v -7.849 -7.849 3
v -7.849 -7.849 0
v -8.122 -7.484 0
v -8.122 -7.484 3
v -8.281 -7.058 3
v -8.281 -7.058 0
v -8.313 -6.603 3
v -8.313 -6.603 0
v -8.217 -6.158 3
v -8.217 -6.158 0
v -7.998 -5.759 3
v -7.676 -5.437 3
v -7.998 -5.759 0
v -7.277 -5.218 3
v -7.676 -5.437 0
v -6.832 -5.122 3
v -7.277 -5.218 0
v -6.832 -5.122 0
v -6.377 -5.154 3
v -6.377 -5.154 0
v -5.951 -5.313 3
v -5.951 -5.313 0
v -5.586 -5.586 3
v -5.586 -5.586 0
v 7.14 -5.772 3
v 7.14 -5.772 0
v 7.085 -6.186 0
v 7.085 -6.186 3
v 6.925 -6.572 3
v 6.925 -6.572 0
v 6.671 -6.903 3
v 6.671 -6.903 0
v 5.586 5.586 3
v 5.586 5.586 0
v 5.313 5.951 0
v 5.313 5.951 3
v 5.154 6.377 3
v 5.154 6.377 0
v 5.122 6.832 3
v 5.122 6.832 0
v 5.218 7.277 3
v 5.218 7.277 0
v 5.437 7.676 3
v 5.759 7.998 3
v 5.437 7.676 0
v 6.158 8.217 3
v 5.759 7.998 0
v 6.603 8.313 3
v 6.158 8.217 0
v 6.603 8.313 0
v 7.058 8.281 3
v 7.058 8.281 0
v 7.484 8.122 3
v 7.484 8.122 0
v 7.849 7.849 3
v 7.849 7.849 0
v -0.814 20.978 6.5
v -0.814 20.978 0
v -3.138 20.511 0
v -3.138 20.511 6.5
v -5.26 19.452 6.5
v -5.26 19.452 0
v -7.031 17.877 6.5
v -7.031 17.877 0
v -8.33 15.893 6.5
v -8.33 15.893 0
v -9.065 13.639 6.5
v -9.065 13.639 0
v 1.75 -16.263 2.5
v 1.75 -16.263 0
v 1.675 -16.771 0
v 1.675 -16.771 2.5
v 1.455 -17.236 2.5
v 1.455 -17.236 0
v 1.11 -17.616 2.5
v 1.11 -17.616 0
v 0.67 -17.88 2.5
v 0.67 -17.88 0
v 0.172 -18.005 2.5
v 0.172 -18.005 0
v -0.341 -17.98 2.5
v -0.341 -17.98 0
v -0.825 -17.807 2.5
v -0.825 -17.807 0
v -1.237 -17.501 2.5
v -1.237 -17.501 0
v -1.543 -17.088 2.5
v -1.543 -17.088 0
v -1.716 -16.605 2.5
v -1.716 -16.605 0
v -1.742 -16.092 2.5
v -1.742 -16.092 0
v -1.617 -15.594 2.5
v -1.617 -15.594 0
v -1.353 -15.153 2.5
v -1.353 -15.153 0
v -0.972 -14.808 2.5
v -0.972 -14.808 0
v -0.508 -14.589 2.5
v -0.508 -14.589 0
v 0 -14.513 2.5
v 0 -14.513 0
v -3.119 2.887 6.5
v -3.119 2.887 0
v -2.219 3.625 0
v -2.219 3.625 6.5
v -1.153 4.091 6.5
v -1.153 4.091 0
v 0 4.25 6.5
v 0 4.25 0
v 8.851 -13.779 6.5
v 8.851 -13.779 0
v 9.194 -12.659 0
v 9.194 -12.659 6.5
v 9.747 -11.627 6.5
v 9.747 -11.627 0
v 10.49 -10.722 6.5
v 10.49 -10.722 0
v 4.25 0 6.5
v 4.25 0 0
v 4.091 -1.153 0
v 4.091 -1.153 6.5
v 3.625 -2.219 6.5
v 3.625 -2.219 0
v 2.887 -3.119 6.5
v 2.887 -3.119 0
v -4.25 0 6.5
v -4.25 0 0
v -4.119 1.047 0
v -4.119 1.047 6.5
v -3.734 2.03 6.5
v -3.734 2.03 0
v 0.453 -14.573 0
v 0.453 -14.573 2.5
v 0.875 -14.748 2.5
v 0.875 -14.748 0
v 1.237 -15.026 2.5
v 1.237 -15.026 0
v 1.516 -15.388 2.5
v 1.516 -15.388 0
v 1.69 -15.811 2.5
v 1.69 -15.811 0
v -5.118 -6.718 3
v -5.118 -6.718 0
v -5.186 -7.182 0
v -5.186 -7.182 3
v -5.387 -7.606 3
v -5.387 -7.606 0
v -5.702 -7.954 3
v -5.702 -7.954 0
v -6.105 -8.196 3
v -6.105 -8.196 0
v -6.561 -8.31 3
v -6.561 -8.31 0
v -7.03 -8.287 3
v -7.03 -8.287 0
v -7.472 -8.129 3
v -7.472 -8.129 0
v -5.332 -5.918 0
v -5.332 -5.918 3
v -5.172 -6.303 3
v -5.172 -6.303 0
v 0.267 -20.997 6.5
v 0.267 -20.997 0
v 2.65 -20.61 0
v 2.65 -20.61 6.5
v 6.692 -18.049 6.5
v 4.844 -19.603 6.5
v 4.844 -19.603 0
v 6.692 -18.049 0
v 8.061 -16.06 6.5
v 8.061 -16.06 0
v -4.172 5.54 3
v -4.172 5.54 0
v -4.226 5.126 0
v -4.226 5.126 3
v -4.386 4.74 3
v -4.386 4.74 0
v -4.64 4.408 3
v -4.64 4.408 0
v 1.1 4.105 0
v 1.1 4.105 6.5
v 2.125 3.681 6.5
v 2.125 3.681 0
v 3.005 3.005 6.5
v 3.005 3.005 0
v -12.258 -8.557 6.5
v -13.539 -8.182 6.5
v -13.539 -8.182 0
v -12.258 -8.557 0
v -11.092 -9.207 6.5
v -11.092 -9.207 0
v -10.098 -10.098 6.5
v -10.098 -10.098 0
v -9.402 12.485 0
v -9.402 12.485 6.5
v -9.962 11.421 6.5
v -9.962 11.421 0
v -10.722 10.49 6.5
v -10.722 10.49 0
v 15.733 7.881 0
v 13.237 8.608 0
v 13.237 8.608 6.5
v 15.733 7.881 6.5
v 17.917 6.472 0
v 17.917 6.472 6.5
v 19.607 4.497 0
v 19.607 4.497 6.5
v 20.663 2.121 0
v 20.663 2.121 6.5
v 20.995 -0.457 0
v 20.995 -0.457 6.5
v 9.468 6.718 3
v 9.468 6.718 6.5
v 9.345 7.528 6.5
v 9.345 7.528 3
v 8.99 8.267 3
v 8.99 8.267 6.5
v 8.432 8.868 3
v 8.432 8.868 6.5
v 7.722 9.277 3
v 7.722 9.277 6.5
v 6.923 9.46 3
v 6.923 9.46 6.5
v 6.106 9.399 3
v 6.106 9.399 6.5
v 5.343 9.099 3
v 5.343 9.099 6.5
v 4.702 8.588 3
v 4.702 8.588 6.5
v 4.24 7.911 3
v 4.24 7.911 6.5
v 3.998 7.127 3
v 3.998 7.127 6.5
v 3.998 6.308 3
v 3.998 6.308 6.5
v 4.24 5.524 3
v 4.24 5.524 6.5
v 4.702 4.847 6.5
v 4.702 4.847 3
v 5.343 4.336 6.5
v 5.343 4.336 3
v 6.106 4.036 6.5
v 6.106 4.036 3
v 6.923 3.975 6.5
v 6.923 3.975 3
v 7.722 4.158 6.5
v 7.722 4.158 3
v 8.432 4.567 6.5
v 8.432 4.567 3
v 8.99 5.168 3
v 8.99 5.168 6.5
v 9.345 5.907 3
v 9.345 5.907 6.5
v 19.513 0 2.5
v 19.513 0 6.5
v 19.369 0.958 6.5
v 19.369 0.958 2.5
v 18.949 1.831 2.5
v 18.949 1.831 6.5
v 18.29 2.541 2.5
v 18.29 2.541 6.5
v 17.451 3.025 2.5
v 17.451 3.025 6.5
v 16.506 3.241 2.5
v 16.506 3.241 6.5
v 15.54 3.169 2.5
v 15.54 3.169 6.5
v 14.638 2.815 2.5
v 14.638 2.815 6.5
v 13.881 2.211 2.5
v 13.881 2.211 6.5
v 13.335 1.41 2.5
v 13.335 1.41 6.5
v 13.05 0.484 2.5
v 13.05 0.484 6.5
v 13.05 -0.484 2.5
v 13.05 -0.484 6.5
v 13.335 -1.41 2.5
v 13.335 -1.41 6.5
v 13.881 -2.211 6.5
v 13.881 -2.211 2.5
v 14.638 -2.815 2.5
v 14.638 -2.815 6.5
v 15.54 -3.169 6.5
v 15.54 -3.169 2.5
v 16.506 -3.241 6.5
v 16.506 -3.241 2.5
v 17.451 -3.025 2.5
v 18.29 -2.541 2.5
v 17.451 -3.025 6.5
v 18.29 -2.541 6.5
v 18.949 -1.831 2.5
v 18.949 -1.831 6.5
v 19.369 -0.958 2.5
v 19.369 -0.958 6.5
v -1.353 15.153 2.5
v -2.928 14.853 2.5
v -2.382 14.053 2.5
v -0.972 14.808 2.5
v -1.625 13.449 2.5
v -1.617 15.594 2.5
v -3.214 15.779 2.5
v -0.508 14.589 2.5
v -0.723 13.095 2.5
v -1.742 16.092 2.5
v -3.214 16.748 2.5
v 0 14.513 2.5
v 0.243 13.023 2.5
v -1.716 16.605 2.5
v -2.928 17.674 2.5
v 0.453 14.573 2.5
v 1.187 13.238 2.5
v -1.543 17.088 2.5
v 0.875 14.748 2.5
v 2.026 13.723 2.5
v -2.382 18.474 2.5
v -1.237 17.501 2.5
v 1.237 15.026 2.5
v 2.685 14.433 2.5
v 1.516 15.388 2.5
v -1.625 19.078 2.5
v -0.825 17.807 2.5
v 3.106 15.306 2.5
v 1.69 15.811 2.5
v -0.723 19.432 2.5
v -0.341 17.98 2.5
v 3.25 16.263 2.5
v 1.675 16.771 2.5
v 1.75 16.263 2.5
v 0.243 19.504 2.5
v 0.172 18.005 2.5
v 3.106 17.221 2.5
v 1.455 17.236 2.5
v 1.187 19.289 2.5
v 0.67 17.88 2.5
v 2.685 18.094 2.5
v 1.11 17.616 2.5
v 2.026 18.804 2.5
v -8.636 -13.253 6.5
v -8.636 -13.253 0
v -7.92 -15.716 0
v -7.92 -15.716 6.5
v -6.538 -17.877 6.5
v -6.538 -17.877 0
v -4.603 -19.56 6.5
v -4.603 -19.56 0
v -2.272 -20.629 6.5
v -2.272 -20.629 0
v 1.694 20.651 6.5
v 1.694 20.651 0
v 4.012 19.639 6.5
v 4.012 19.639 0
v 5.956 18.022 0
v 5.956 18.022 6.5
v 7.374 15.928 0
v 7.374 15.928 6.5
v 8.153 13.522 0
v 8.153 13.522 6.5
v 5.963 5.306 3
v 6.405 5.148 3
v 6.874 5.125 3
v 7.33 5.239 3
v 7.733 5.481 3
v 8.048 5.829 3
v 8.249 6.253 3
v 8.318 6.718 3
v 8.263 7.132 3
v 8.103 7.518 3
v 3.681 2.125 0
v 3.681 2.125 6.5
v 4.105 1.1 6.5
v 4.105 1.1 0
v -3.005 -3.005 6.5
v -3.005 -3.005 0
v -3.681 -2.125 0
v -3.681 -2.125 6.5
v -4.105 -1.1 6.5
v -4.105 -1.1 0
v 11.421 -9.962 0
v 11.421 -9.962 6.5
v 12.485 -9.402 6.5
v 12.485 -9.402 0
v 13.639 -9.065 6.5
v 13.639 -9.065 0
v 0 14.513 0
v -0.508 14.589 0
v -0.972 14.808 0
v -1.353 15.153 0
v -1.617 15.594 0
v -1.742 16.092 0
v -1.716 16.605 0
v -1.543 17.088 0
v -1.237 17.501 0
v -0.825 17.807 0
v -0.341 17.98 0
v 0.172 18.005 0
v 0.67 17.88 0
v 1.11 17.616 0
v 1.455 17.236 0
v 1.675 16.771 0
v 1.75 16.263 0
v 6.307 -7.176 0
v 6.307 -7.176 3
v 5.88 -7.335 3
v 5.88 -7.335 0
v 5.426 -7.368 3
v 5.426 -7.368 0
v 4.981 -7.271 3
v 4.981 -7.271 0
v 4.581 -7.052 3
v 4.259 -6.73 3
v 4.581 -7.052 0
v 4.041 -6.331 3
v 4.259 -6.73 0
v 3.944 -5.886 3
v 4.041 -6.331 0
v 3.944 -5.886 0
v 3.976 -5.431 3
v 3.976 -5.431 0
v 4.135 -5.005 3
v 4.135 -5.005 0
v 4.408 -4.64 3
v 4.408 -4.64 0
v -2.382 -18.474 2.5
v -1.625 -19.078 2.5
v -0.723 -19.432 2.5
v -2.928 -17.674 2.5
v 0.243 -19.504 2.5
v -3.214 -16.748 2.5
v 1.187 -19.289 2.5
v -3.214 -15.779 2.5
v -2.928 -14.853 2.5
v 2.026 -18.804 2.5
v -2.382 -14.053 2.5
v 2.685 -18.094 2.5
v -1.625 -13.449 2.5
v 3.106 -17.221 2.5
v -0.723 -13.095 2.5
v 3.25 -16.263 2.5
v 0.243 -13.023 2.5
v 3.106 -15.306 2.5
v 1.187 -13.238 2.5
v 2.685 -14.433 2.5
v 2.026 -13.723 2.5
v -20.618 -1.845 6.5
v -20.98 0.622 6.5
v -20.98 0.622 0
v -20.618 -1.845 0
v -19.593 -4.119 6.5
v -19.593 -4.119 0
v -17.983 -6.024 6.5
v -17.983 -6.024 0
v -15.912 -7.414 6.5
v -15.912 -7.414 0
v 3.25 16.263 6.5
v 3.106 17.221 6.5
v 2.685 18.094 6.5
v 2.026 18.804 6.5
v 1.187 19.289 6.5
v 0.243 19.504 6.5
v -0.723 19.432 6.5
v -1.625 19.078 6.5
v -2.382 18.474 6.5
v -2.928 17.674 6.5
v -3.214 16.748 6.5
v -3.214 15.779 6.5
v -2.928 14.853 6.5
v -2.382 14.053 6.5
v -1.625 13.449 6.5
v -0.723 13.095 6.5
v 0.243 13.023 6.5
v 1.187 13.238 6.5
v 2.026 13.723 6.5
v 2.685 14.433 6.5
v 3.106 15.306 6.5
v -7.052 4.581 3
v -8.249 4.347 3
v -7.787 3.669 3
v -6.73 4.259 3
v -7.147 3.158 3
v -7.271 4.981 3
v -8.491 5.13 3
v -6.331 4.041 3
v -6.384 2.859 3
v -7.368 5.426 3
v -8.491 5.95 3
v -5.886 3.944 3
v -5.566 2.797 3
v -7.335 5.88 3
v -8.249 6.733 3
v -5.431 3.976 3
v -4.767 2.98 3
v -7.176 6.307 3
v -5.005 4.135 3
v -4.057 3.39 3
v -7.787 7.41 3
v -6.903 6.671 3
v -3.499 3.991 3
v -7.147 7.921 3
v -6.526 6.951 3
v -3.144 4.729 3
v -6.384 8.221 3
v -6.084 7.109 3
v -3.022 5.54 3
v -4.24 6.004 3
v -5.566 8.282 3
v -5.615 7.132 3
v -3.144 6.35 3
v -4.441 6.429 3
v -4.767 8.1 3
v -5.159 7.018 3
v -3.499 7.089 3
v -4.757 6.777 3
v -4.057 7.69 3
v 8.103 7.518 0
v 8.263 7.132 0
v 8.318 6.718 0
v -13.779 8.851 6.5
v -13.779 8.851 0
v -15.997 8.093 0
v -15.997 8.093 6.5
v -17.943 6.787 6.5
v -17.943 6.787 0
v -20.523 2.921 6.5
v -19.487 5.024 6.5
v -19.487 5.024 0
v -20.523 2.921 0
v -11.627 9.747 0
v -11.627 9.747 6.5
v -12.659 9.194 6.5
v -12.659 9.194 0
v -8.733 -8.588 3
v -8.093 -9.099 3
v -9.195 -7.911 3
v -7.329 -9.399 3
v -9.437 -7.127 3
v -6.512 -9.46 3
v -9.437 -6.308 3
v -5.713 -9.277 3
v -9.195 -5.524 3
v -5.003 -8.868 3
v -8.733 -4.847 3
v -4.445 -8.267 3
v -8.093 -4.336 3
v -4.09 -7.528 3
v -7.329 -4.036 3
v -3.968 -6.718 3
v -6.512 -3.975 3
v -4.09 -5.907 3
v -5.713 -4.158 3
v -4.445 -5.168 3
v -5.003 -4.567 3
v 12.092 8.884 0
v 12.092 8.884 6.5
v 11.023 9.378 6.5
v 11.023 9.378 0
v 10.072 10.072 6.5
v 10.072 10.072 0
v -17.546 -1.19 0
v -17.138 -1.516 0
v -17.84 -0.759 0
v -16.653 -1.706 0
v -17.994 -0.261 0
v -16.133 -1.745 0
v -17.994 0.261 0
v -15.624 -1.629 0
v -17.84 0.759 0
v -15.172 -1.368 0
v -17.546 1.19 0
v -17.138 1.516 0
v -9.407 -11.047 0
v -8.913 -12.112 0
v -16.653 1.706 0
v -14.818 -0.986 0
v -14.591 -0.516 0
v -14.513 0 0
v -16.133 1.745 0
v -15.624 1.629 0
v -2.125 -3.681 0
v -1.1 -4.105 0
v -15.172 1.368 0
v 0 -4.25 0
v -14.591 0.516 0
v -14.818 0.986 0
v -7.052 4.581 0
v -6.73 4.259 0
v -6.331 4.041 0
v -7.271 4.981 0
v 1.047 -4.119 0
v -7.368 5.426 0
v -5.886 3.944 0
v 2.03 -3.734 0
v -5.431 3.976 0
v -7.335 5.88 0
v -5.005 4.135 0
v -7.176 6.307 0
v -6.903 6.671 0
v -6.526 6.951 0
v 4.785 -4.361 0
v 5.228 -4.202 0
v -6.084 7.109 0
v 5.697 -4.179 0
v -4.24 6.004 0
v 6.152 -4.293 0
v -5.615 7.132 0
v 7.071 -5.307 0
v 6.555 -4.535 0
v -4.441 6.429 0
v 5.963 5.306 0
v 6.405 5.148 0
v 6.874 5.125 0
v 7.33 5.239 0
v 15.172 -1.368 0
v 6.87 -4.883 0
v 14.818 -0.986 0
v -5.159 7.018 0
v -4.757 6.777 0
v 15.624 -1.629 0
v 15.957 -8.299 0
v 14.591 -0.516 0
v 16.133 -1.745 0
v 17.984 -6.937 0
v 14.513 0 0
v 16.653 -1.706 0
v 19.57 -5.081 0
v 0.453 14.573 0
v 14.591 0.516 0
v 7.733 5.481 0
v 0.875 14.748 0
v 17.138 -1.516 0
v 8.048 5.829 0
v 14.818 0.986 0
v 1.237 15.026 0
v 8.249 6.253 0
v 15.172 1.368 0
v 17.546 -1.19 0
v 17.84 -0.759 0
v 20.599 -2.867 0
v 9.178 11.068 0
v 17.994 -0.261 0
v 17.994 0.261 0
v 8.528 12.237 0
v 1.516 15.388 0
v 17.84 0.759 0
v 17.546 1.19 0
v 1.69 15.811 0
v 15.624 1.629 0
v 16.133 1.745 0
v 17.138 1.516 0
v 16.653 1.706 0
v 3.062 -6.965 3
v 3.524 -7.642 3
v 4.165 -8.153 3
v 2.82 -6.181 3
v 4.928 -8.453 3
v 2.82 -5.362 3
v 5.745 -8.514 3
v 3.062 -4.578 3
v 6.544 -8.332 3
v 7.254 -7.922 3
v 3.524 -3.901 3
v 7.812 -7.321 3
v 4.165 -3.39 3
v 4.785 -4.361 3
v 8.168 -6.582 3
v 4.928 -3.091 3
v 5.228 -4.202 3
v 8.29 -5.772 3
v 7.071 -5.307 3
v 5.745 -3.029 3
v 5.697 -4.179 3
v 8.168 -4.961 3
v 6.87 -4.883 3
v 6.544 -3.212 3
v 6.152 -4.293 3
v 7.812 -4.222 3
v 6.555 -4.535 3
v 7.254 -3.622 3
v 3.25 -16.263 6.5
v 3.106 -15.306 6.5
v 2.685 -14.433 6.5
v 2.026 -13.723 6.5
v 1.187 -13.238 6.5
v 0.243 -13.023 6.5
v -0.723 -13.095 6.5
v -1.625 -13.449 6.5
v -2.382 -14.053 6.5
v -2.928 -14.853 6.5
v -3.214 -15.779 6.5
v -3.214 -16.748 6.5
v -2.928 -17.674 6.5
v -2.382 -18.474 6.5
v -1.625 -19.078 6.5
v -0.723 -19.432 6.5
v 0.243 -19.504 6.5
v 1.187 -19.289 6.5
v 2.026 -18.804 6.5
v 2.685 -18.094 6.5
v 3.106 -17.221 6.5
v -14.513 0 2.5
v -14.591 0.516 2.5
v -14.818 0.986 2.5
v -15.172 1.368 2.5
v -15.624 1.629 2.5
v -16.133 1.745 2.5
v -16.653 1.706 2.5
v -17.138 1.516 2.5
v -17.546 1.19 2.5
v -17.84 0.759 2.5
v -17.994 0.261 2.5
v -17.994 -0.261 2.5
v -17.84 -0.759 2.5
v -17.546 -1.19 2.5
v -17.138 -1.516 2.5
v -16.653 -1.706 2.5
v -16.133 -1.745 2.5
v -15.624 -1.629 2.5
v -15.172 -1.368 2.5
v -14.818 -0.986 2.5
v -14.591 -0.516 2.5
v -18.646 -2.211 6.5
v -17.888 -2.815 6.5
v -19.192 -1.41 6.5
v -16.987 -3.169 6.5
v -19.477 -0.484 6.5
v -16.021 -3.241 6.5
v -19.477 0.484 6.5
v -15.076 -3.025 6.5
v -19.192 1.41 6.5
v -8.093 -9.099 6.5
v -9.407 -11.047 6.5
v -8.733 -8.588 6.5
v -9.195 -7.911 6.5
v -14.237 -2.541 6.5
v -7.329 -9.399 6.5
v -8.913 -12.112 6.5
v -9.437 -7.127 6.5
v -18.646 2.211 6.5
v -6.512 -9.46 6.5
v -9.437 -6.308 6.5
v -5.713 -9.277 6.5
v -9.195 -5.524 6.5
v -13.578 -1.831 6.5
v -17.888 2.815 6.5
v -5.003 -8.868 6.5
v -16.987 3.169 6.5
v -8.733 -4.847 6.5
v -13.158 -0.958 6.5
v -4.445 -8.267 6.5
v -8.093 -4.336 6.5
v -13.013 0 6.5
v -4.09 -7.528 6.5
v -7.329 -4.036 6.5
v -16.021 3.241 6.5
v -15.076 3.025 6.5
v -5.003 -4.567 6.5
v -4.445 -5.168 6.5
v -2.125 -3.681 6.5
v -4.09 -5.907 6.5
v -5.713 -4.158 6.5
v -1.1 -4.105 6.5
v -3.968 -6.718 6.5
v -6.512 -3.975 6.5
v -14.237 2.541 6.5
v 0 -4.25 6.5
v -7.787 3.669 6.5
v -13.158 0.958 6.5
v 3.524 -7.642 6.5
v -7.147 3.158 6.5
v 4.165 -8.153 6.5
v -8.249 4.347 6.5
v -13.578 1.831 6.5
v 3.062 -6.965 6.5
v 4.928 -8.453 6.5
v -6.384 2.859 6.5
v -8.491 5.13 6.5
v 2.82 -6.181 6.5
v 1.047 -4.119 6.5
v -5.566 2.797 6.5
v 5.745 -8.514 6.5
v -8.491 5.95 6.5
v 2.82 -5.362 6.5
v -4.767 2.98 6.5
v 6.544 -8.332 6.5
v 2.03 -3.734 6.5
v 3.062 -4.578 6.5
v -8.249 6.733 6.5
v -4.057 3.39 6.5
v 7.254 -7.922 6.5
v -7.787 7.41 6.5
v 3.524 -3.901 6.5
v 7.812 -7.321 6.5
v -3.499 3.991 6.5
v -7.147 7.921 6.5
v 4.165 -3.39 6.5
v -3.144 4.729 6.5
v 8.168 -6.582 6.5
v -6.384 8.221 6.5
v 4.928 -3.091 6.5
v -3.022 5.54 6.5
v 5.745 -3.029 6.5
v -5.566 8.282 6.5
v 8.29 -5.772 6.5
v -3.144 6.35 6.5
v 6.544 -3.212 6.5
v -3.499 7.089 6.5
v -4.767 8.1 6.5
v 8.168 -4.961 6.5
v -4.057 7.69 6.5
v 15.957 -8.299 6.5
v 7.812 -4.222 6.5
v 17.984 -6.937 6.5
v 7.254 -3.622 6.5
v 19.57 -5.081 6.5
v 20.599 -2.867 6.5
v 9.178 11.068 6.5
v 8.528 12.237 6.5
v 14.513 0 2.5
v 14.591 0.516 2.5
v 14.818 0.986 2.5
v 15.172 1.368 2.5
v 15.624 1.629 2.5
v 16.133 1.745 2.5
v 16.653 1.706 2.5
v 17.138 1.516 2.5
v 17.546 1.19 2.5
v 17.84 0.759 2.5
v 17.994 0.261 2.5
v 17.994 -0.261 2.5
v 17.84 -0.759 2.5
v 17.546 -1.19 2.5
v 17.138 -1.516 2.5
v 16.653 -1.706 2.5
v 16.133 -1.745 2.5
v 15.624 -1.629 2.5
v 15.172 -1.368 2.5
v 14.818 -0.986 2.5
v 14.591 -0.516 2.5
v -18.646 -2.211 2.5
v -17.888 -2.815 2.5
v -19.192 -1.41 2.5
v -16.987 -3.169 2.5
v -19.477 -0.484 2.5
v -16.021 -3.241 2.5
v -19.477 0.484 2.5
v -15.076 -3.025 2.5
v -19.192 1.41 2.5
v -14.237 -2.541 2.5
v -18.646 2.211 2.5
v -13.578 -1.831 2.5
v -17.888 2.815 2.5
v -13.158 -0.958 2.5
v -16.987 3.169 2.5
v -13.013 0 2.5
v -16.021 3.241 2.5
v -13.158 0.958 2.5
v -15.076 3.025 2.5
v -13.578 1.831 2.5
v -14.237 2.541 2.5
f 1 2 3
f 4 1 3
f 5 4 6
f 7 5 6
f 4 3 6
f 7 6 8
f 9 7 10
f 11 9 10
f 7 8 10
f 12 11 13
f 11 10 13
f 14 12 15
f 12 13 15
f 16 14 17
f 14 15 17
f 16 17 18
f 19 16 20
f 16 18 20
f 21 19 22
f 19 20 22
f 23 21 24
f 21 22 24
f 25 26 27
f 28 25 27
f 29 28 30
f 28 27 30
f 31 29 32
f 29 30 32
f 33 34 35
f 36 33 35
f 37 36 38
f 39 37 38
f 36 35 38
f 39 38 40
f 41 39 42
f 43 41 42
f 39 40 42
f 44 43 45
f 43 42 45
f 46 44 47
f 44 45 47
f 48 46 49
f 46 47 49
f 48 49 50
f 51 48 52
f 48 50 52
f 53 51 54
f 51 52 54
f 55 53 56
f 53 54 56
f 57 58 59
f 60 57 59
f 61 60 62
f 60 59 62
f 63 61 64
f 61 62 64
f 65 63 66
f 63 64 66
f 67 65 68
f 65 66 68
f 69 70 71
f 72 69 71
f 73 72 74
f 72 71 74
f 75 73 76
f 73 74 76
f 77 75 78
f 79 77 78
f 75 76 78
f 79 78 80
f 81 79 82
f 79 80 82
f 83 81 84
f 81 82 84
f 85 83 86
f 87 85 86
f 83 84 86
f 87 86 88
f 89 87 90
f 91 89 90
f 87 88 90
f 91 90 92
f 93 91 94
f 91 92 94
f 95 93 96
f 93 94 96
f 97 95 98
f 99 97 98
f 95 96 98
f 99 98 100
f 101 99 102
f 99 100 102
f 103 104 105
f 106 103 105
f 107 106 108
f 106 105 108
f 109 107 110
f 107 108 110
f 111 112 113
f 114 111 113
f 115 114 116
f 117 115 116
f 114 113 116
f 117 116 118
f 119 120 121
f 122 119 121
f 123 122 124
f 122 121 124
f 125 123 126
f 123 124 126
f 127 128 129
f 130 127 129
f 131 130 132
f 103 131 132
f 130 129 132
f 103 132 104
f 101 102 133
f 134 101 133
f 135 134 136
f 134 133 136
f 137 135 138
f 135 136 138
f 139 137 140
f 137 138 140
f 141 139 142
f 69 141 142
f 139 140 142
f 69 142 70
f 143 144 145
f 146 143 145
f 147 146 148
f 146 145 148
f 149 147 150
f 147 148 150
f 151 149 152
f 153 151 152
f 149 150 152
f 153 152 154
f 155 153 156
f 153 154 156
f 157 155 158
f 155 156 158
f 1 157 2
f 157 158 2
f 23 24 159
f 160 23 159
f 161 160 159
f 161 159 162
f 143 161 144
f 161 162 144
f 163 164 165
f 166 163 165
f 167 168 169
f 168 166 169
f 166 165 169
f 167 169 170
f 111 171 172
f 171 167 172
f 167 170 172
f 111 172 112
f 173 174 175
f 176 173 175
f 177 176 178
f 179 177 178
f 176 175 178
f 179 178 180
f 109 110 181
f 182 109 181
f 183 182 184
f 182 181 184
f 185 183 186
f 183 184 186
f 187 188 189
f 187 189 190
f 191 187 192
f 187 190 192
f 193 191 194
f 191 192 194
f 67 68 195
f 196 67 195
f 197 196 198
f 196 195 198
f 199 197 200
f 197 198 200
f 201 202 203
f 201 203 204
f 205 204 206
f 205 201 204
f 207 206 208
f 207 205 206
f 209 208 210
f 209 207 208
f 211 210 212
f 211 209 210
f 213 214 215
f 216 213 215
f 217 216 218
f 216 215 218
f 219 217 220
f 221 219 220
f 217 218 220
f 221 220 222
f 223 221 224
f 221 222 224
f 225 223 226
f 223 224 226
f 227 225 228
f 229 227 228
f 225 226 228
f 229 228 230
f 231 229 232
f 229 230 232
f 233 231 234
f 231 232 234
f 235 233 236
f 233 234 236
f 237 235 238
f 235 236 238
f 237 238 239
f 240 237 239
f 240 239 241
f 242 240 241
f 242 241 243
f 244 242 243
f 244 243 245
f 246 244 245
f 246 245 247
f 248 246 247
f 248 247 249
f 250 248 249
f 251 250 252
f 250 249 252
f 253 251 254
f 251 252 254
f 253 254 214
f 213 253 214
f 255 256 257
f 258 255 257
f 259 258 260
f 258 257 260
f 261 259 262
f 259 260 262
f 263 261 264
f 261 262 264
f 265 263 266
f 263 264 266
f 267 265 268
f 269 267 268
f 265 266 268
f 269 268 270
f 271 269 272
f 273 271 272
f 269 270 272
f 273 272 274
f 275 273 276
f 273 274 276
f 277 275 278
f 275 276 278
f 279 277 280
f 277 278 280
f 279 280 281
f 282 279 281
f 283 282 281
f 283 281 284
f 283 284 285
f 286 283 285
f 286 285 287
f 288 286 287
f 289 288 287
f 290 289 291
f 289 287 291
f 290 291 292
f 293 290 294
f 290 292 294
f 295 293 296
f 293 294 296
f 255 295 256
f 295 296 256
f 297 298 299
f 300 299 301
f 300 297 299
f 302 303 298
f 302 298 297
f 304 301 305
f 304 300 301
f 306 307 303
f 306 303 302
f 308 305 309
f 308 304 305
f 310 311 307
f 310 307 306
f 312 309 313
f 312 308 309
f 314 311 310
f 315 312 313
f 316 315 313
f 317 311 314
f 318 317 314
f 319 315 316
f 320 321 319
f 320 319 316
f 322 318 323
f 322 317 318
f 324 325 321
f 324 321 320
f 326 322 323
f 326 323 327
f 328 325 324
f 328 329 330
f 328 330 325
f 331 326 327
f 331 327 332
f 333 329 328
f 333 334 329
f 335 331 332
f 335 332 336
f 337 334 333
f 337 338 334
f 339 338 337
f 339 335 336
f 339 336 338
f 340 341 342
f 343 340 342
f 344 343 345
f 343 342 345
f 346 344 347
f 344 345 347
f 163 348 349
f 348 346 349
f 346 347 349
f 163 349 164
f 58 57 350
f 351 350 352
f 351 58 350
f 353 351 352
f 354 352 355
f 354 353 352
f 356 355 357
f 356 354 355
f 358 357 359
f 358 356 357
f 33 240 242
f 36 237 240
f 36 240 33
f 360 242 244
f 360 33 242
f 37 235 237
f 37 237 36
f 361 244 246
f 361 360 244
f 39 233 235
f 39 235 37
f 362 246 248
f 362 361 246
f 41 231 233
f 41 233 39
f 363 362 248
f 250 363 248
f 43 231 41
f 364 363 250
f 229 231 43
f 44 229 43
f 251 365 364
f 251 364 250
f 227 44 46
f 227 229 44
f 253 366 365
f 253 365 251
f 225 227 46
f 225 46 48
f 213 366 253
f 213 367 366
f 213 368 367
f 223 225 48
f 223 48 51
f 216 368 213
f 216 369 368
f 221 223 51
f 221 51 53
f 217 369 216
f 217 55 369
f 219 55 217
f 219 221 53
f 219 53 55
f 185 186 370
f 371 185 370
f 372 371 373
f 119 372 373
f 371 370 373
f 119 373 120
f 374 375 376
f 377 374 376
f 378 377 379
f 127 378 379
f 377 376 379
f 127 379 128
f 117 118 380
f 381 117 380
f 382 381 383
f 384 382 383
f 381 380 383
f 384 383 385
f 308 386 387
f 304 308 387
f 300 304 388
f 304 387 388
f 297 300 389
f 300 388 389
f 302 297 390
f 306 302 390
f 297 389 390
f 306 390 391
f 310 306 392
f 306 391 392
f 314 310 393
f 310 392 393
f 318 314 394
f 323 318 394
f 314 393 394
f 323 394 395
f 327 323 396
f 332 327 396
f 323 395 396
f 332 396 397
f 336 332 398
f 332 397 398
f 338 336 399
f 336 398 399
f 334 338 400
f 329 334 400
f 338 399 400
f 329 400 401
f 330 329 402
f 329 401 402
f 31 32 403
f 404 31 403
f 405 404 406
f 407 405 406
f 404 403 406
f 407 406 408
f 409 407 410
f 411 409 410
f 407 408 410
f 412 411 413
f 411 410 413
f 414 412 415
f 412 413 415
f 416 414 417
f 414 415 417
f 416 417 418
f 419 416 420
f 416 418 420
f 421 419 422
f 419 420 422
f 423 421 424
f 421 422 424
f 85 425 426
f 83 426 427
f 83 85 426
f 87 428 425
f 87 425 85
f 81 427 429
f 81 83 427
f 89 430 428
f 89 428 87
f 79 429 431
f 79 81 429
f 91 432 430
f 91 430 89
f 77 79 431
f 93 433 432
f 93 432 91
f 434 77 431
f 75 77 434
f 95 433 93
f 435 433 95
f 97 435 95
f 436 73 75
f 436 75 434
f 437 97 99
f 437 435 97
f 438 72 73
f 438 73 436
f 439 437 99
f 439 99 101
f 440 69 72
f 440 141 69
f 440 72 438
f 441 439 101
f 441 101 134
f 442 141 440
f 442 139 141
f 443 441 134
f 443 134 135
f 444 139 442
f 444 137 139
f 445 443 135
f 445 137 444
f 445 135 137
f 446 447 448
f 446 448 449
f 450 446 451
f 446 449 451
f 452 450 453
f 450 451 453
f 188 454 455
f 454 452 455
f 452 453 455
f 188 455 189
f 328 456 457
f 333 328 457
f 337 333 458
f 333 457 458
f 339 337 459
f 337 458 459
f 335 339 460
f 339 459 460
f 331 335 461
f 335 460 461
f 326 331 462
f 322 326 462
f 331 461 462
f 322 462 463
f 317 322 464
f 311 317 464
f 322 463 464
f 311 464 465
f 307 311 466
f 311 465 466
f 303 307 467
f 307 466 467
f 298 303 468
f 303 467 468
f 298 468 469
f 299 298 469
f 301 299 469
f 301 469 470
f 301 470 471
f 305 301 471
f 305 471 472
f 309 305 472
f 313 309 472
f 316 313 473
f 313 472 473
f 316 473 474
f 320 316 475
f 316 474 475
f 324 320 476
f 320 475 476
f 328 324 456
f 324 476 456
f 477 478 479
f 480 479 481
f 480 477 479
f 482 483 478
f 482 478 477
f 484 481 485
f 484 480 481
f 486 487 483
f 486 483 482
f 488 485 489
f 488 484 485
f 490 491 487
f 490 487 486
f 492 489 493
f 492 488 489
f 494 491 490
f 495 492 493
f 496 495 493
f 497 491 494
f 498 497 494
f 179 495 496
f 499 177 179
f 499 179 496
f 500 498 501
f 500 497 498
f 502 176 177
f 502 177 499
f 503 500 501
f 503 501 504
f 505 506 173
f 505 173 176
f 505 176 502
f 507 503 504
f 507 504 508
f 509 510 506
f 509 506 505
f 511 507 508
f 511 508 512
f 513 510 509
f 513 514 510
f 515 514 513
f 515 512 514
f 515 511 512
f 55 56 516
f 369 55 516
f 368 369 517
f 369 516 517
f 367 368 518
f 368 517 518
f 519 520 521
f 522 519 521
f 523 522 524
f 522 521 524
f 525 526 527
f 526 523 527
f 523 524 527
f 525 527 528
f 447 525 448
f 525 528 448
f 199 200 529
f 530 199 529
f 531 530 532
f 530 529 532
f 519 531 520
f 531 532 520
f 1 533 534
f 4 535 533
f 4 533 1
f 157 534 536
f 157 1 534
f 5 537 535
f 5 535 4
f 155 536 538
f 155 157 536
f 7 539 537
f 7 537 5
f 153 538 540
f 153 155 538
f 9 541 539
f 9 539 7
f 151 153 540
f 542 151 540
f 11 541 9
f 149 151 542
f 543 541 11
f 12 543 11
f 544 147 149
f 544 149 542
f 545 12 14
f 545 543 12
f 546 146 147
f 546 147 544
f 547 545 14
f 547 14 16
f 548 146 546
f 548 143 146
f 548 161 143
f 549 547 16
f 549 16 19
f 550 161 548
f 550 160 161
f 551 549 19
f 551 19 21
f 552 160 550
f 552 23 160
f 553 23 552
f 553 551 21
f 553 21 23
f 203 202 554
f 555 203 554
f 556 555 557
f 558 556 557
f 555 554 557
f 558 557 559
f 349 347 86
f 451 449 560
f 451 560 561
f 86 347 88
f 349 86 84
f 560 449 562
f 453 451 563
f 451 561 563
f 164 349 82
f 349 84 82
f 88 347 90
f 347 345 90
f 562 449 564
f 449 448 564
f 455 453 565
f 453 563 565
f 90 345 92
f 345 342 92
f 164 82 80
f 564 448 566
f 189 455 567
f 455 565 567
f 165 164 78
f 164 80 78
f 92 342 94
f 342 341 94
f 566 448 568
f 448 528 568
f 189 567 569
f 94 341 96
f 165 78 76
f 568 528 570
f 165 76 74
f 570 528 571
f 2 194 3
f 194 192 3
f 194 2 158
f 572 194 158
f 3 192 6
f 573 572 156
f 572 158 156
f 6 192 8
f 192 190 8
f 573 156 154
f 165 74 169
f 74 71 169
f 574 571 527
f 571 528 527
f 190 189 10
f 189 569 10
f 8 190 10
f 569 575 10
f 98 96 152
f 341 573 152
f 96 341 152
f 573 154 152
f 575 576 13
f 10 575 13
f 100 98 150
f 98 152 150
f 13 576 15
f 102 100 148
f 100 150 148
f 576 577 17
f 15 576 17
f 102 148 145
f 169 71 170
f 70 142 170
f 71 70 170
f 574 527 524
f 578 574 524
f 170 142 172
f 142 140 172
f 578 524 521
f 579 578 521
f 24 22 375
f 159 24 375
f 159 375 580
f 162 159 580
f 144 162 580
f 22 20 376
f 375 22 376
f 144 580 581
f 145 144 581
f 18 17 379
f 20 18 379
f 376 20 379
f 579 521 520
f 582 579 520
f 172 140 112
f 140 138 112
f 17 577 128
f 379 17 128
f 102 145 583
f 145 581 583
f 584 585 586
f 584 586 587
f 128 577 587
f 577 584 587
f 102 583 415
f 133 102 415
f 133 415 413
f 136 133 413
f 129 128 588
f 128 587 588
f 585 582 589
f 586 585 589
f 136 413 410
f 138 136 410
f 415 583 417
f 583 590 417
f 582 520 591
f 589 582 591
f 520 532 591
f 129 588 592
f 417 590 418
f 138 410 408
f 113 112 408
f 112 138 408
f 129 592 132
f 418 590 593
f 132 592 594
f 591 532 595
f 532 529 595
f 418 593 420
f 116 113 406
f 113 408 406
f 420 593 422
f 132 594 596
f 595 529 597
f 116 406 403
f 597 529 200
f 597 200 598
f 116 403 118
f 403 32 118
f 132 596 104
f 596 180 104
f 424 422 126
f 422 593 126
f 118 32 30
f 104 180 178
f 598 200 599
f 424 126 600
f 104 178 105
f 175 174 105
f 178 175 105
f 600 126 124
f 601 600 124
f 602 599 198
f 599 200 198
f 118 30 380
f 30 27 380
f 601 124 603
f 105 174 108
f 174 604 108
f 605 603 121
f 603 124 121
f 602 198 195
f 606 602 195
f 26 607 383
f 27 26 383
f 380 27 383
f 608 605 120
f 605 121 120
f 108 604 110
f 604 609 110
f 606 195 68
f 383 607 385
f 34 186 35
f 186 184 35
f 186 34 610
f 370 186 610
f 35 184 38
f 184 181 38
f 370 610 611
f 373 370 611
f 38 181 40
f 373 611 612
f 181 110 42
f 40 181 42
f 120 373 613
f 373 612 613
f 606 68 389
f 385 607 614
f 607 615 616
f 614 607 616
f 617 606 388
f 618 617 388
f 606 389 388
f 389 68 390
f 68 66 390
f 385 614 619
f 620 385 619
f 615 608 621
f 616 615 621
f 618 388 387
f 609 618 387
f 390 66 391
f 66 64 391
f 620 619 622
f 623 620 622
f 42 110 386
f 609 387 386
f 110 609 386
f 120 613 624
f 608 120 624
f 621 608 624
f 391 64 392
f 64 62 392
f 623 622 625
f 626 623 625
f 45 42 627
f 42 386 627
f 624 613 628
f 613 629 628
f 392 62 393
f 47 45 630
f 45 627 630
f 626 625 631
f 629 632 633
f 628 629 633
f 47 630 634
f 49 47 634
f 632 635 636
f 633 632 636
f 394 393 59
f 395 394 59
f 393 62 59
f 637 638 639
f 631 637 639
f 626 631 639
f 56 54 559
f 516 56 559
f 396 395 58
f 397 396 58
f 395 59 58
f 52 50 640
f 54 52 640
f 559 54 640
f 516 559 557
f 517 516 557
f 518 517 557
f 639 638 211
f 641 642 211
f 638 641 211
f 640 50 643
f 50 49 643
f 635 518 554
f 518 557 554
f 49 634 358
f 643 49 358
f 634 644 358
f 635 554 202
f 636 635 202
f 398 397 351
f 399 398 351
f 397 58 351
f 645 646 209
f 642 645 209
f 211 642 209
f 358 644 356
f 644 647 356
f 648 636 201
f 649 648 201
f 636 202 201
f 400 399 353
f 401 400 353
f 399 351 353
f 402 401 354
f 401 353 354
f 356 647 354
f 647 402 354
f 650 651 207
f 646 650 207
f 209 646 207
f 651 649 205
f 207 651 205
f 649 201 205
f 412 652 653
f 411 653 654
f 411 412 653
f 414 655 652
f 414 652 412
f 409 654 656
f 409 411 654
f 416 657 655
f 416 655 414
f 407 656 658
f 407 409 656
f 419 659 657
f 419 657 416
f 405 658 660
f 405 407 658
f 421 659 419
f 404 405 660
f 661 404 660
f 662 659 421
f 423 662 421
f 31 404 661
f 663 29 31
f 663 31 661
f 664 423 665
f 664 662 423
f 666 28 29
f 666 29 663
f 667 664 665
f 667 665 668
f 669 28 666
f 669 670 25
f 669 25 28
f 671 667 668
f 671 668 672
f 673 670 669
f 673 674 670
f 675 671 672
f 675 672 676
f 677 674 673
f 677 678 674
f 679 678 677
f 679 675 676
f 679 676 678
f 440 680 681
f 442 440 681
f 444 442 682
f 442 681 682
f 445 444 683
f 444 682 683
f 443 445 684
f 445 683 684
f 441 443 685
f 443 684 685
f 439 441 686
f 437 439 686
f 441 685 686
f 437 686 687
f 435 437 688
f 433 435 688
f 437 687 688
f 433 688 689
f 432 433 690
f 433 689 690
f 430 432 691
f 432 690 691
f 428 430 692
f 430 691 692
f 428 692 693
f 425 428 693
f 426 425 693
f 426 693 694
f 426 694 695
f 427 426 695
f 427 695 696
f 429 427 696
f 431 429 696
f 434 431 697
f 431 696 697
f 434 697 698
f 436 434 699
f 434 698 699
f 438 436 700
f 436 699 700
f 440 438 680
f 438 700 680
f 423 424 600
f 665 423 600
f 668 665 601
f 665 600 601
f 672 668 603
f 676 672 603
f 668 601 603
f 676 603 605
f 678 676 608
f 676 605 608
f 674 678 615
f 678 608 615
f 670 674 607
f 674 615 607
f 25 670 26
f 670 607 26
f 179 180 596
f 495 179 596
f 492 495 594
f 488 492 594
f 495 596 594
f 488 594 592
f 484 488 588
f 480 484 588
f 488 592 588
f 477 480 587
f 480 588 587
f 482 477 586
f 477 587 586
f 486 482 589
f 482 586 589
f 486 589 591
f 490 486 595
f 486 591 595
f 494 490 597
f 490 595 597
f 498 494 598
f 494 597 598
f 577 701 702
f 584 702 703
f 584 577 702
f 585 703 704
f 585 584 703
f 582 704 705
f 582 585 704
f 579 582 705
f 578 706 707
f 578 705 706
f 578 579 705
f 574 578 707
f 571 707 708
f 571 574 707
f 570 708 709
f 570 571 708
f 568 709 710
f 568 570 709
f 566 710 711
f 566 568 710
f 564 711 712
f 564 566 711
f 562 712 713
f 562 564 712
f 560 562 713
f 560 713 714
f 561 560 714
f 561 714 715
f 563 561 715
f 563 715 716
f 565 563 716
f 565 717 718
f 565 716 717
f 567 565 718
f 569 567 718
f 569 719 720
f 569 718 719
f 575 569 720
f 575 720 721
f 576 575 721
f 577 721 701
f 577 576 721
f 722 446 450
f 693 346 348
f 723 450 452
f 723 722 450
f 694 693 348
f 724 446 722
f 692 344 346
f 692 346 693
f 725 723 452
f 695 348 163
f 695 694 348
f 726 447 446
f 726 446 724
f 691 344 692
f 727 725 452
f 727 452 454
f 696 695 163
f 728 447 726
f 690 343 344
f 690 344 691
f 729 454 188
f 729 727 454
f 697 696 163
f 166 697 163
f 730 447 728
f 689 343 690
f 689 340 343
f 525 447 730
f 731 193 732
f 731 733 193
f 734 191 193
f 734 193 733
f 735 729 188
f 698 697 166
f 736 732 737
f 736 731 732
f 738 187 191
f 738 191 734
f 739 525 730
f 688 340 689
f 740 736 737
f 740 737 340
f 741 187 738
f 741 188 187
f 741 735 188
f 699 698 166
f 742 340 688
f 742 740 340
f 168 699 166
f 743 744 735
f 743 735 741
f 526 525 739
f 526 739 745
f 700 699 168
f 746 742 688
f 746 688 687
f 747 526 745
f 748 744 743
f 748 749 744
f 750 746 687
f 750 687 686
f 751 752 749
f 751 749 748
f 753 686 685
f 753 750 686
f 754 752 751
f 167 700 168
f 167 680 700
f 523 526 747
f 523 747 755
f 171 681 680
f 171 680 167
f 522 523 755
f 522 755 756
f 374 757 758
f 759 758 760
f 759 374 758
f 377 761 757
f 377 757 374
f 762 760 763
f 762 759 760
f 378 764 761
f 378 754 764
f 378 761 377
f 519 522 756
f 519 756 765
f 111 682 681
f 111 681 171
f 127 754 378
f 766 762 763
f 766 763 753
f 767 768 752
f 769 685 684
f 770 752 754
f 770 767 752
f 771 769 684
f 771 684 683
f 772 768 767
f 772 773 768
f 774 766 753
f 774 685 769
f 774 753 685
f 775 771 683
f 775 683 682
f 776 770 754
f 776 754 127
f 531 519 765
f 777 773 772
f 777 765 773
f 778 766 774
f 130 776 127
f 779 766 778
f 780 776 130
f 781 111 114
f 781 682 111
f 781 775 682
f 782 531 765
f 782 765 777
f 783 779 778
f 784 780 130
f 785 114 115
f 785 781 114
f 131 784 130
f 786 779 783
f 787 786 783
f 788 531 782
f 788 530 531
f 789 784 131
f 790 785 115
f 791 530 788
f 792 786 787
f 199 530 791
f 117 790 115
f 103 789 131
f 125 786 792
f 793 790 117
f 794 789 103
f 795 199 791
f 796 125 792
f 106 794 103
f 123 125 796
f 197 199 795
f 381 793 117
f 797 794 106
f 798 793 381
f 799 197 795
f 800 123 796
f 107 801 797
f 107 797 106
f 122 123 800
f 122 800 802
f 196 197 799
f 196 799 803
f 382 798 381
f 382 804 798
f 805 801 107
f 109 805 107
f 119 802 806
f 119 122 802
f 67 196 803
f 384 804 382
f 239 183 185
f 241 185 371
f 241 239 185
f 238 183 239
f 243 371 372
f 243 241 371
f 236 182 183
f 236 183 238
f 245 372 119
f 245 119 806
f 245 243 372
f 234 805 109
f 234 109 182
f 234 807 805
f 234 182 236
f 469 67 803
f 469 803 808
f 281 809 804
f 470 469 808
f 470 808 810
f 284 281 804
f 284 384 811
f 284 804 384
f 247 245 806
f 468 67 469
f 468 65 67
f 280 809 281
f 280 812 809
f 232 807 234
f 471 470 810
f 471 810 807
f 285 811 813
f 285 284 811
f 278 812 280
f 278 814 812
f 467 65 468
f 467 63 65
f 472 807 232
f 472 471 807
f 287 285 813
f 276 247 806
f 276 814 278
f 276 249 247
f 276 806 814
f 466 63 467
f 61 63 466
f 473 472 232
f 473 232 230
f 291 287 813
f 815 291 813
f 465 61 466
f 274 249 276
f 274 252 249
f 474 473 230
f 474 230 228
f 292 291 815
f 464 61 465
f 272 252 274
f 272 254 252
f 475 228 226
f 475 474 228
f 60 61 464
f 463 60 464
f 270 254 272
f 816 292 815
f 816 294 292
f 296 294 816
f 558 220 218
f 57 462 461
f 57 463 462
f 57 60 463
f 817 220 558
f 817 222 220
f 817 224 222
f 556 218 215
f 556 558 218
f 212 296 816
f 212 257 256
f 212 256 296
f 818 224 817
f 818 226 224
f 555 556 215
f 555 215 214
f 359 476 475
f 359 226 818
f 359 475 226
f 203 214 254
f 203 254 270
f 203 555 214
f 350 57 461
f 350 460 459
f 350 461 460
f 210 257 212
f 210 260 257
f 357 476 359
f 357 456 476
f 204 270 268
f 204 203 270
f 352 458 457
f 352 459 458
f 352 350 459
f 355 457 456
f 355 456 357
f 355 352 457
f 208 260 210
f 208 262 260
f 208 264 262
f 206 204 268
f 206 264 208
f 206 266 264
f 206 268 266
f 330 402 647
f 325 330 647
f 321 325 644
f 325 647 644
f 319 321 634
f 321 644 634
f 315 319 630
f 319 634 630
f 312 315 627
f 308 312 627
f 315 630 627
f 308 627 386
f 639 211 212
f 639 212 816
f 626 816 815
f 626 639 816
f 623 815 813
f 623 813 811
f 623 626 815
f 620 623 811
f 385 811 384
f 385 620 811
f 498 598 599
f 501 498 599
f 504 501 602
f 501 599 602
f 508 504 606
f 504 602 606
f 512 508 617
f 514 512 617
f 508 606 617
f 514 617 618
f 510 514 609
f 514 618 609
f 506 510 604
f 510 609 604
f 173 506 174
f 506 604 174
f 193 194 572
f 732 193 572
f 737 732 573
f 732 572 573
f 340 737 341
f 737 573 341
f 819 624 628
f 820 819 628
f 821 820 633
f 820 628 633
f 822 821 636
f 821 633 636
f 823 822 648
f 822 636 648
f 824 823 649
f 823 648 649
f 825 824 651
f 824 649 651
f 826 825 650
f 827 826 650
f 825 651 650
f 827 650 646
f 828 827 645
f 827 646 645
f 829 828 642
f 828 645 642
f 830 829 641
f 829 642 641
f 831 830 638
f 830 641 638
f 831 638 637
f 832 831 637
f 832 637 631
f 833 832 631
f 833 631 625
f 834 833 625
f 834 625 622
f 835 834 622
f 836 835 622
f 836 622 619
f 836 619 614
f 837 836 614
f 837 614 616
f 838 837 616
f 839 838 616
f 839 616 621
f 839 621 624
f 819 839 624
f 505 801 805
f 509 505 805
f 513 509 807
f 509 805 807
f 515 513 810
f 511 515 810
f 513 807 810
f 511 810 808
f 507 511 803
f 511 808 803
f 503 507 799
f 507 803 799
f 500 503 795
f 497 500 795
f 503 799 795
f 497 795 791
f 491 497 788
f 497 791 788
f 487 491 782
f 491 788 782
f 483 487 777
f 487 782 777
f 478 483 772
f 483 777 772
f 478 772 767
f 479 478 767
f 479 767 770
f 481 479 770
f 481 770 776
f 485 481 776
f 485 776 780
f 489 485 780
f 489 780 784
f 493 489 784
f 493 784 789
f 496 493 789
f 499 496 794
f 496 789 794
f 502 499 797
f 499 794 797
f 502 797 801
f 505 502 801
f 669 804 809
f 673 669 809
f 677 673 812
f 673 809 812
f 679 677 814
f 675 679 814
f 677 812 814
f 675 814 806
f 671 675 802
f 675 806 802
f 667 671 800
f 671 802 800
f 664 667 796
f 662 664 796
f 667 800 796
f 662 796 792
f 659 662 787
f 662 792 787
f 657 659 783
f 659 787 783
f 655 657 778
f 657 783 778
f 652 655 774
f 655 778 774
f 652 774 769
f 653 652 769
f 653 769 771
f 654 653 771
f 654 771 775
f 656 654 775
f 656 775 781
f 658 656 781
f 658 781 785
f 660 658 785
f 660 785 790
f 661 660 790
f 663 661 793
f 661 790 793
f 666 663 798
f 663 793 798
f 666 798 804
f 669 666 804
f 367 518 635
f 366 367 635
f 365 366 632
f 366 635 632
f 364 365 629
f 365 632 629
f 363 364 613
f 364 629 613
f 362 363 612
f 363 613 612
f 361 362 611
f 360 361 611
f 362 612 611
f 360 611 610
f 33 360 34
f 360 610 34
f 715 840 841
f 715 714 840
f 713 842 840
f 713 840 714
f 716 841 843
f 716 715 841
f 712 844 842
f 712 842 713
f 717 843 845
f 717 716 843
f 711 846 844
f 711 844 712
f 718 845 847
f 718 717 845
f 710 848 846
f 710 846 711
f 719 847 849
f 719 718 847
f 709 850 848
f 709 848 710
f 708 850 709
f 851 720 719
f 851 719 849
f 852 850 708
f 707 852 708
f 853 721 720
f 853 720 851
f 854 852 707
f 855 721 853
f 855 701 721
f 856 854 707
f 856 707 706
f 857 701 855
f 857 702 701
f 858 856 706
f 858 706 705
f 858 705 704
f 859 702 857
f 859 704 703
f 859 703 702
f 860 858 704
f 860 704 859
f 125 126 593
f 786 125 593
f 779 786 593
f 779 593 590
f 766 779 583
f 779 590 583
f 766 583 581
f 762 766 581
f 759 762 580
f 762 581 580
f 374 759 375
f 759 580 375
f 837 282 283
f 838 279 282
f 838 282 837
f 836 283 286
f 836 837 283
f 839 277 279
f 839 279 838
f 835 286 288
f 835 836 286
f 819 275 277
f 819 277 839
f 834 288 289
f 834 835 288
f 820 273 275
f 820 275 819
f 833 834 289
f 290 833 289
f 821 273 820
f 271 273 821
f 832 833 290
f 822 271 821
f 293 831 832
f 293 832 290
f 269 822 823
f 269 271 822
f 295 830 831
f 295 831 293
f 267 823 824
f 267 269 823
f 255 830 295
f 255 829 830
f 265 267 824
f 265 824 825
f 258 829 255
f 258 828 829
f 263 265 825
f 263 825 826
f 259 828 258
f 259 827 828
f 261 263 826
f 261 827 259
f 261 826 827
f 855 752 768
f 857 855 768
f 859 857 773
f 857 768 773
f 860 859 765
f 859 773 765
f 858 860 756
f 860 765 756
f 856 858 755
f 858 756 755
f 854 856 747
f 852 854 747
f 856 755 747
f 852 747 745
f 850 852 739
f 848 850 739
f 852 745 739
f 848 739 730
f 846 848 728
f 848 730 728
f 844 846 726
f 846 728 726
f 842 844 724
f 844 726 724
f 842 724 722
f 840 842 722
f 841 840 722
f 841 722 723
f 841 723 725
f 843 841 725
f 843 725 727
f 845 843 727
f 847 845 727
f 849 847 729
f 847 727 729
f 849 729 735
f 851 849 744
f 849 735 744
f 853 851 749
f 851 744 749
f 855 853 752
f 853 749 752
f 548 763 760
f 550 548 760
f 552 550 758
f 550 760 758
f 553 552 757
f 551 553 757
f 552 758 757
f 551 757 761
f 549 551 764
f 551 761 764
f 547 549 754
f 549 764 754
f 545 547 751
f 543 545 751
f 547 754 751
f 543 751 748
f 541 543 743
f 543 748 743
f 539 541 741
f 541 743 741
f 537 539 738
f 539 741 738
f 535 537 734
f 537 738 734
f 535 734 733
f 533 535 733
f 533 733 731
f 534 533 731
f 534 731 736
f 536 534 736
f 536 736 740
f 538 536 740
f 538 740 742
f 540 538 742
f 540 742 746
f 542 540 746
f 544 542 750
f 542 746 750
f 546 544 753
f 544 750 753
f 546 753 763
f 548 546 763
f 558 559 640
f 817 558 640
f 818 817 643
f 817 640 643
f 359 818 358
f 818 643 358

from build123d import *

# Parameters (mm, degrees)
F2_R        = 1.75
F3_DEPTH    = 6.5
F4_R        = 2.75
F5_DEPTH    = 3.5
F6_T1_DEPTH = 57.2838374918
F6_T3_DEPTH = 62.3332762367
F6_T5_DEPTH = 62.0777502529
F7_R        = 3.25
F8_DEPTH    = 4


# Not quite as in the source:
# - a fillet or chamfer that OpenCascade refuses, or shapes differently, is made with other operations: its cross-section is extruded or revolved along the edge and cut away or added


with BuildPart() as f3:
    # F2 (on Top) → F3 (new body)
    with BuildSketch(Plane.XY):
        with BuildLine():
            ThreePointArc((-3.1189043715, 2.8870288397), (-1.7018559621, 3.894378806), (0, 4.25))
            ThreePointArc((0, 4.25), (1.6264045876, 3.9264880132), (3.00520382, 3.00520382))
            Line((3.00520382, 3.00520382), (5.5861435714, 5.5861435714))
            ThreePointArc((5.5861435714, 5.5861435714), (5.5861435714, 7.8488852712), (7.8488852712, 7.8488852712))
            Line((7.8488852712, 7.8488852712), (10.0716416635, 10.0716416635))
            ThreePointArc((10.0716416635, 10.0716416635), (8.0706751581, 14.271751719), (9.6732808742, 18.6394108579))
            ThreePointArc((9.6732808742, 18.6394108579), (-0.2919239613, 20.9979708639), (-10.1877103957, 18.3632937376))
            ThreePointArc((-10.1877103957, 18.3632937376), (-9.2786875084, 16.6483019778), (-8.9647275629, 14.732852031))
            ThreePointArc((-8.9647275629, 14.732852031), (-9.4214503678, 12.4367514369), (-10.7220868758, 10.4902113439))
            Line((-10.7220868758, 10.4902113439), (-6.9029746628, 6.6710991309))
            ThreePointArc((-6.9029746628, 6.6710991309), (-5.1593103211, 7.017935533), (-4.1716038129, 5.539728281))
            ThreePointArc((-4.1716038129, 5.539728281), (-4.2933965608, 4.9274347892), (-4.640232963, 4.4083574311))
            Line((-4.640232963, 4.4083574311), (-3.1189043715, 2.8870288397))
        make_face()
        with BuildLine():
            ThreePointArc((0, 14.5134559673), (-1.2374368671, 17.5008928344), (1.75, 16.2634559673))
            ThreePointArc((1.75, 16.2634559673), (1.2374368671, 15.0260191002), (0, 14.5134559673))
        make_face(mode=Mode.SUBTRACT)
        with BuildLine():
            ThreePointArc((-4.25, 0), (-3.9571355536, 1.5503477708), (-3.1189043715, 2.8870288397))
            Line((-3.1189043715, 2.8870288397), (-4.640232963, 4.4083574311))
            ThreePointArc((-4.640232963, 4.4083574311), (-6.9029746628, 4.4083574311), (-6.9029746628, 6.6710991309))
            Line((-6.9029746628, 6.6710991309), (-10.7220868758, 10.4902113439))
            ThreePointArc((-10.7220868758, 10.4902113439), (-14.5116932272, 8.7499798202), (-18.5201343168, 9.899728526))
            ThreePointArc((-18.5201343168, 9.899728526), (-20.9996146914, 0.1272116798), (-18.6387120488, -9.674627288))
            ThreePointArc((-18.6387120488, -9.674627288), (-14.279821029, -8.0983145468), (-10.0983841523, -10.0983841523))
            Line((-10.0983841523, -10.0983841523), (-7.8488852712, -7.8488852712))
            ThreePointArc((-7.8488852712, -7.8488852712), (-7.8488852712, -5.5861435714), (-5.5861435714, -5.5861435714))
            Line((-5.5861435714, -5.5861435714), (-3.00520382, -3.00520382))
            ThreePointArc((-3.00520382, -3.00520382), (-3.9264880132, -1.6264045876), (-4.25, 0))
        make_face()
        with Locations((-16.2634559673, 0)):
            Circle(F2_R, mode=Mode.SUBTRACT)
        with BuildLine():
            Line((5.5861435714, 5.5861435714), (3.00520382, 3.00520382))
            ThreePointArc((3.00520382, 3.00520382), (3.9264880132, 1.6264045876), (4.25, 0))
            ThreePointArc((4.25, 0), (3.894378806, -1.7018559621), (2.8870288397, -3.1189043715))
            Line((2.8870288397, -3.1189043715), (4.4083574311, -4.640232963))
            ThreePointArc((4.4083574311, -4.640232963), (6.1520217728, -4.2933965608), (7.139728281, -5.7716038129))
            ThreePointArc((7.139728281, -5.7716038129), (7.017935533, -6.3838973046), (6.6710991309, -6.9029746628))
            Line((6.6710991309, -6.9029746628), (10.4902113439, -10.7220868758))
            ThreePointArc((10.4902113439, -10.7220868758), (14.3265437078, -8.9785005753), (18.3632937376, -10.1877103957))
            ThreePointArc((18.3632937376, -10.1877103957), (20.3301397989, -5.2616932403), (21, 0))
            ThreePointArc((21, 0), (20.3137902, 5.3244650163), (18.3000068848, 10.3009585969))
            ThreePointArc((18.3000068848, 10.3009585969), (14.2313497781, 8.552751018), (10.0716416635, 10.0716416635))
            Line((10.0716416635, 10.0716416635), (7.8488852712, 7.8488852712))
            ThreePointArc((7.8488852712, 7.8488852712), (8.1957216733, 7.3298079131), (8.3175144213, 6.7175144213))
            ThreePointArc((8.3175144213, 6.7175144213), (7.3298079131, 5.2393071693), (5.5861435714, 5.5861435714))
        make_face()
        with BuildLine():
            ThreePointArc((18.0134559673, 0), (16.2634559673, -1.75), (14.5134559673, 0))
            ThreePointArc((14.5134559673, 0), (16.2634559673, 1.75), (18.0134559673, 0))
        make_face(mode=Mode.SUBTRACT)
        with BuildLine():
            Line((4.4083574311, -4.640232963), (2.8870288397, -3.1189043715))
            ThreePointArc((2.8870288397, -3.1189043715), (1.5503477708, -3.9571355536), (0, -4.25))
            ThreePointArc((0, -4.25), (-1.6264045876, -3.9264880132), (-3.00520382, -3.00520382))
            Line((-3.00520382, -3.00520382), (-5.5861435714, -5.5861435714))
            ThreePointArc((-5.5861435714, -5.5861435714), (-5.2393071693, -6.1052209295), (-5.1175144213, -6.7175144213))
            ThreePointArc((-5.1175144213, -6.7175144213), (-6.1052209295, -8.1957216733), (-7.8488852712, -7.8488852712))
            Line((-7.8488852712, -7.8488852712), (-10.0983841523, -10.0983841523))
            ThreePointArc((-10.0983841523, -10.0983841523), (-8.9703530251, -11.9546705323), (-8.577165246, -14.0909422189))
            ThreePointArc((-8.577165246, -14.0909422189), (-9.024856678, -16.365116699), (-10.301121768, -18.2999150359))
            ThreePointArc((-10.301121768, -18.2999150359), (-0.2289175978, -20.9987522661), (9.899728526, -18.5201343168))
            ThreePointArc((9.899728526, -18.5201343168), (8.7499798202, -14.5116932272), (10.4902113439, -10.7220868758))
            Line((10.4902113439, -10.7220868758), (6.6710991309, -6.9029746628))
            ThreePointArc((6.6710991309, -6.9029746628), (4.4083574311, -6.9029746628), (4.4083574311, -4.640232963))
        make_face()
        with BuildLine():
            ThreePointArc((1.75, -16.2634559673), (-1.2374368671, -17.5008928344), (0, -14.5134559673))
            ThreePointArc((0, -14.5134559673), (1.2374368671, -15.0260191002), (1.75, -16.2634559673))
        make_face(mode=Mode.SUBTRACT)
    extrude(amount=F3_DEPTH)

    # F4 (on face) → F5 (cut)
    with BuildSketch(Plane.XY.offset(6.5)):
        with Locations((-5.7716038129, 5.539728281)):
            Circle(F4_R)
        with Locations((5.539728281, -5.7716038129)):
            Circle(F4_R)
        with Locations((-6.7175144213, -6.7175144213)):
            Circle(F4_R)
        with Locations((6.7175144213, 6.7175144213)):
            Circle(F4_R)
    extrude(amount=-F5_DEPTH, mode=Mode.SUBTRACT)

    # F6: fillet of radius 9 on 8 edges, made by hand

    # F6_s2 → F6_t1 (cut)
    with BuildSketch(Plane.XY.offset(-25.3919187459)):
        with BuildLine():
            ThreePointArc((-0.3782425644, 20.9965933561), (-6.0328802021, 18.8657689221), (-9.065291981, 13.6389325572))
            ThreePointArc((-9.065291981, 13.6389325572), (-9.1272145679, 16.1197341578), (-10.1877103957, 18.3632937376))
            ThreePointArc((-10.1877103957, 18.3632937376), (-5.4445759439, 20.2819277385), (-0.3782425644, 20.9965933561))
        make_face()
        with BuildLine():
            ThreePointArc((20.9965933561, -0.3782425644), (18.8657689221, -6.0328802021), (13.6389325572, -9.065291981))
            ThreePointArc((13.6389325572, -9.065291981), (16.1197341578, -9.1272145679), (18.3632937376, -10.1877103957))
            ThreePointArc((18.3632937376, -10.1877103957), (20.2819277385, -5.4445759439), (20.9965933561, -0.3782425644))
        make_face()
        with BuildLine():
            ThreePointArc((-13.7788227476, 8.8512170739), (-18.9576712537, 5.7375588181), (-20.9999396683, 0.0503381168))
            ThreePointArc((-20.9999396683, 0.0503381168), (-20.3644711398, 5.1272131997), (-18.5201343168, 9.899728526))
            ThreePointArc((-18.5201343168, 9.899728526), (-16.2602888025, 8.8743948046), (-13.7788227476, 8.8512170739))
        make_face()
        with BuildLine():
            ThreePointArc((0.0503381168, -20.9999396683), (5.7375588181, -18.9576712537), (8.8512170739, -13.7788227476))
            ThreePointArc((8.8512170739, -13.7788227476), (8.8743948046, -16.2602888025), (9.899728526, -18.5201343168))
            ThreePointArc((9.899728526, -18.5201343168), (5.1272131997, -20.3644711398), (0.0503381168, -20.9999396683))
        make_face()
    extrude(amount=F6_T1_DEPTH, mode=Mode.SUBTRACT)

    # F6_s4 → F6_t3 (cut)
    with BuildSketch(Plane.XY.offset(-27.9166381183)):
        with BuildLine():
            ThreePointArc((-1.2489870314, 20.962824986), (4.8716041748, 19.0359733336), (8.1530373835, 13.5217562449))
            ThreePointArc((8.1530373835, 13.5217562449), (8.3126072664, 16.2589826676), (9.6732808742, 18.6394108579))
            ThreePointArc((9.6732808742, 18.6394108579), (4.3694101421, 20.5404054247), (-1.2489870314, 20.962824986))
        make_face()
        with BuildLine():
            ThreePointArc((13.2369559696, 8.6077236934), (18.8594743215, 5.515526839), (20.993156783, -0.5360674268))
            ThreePointArc((20.993156783, -0.5360674268), (20.3800996321, 5.0647348385), (18.3000068848, 10.3009585969))
            ThreePointArc((18.3000068848, 10.3009585969), (15.9671809198, 8.8601969743), (13.2369559696, 8.6077236934))
        make_face()
    extrude(amount=F6_T3_DEPTH, mode=Mode.SUBTRACT)

    # F6_s6 → F6_t5 (cut)
    with BuildSketch(Plane.XY.offset(-27.7888751265)):
        with BuildLine():
            ThreePointArc((-8.6359238746, -13.2532961322), (-5.5485972344, -18.85793385), (0.4828918194, -20.9944472538))
            ThreePointArc((0.4828918194, -20.9944472538), (-5.090632161, -20.3736463158), (-10.301121768, -18.2999150359))
            ThreePointArc((-10.301121768, -18.2999150359), (-8.8793307439, -15.9710172139), (-8.6359238746, -13.2532961322))
        make_face()
        with BuildLine():
            ThreePointArc((-20.9659970002, 1.1945584074), (-19.0352466943, -4.9059131307), (-13.5385270334, -8.1815234096))
            ThreePointArc((-13.5385270334, -8.1815234096), (-16.2629392178, -8.3326294351), (-18.6387120488, -9.674627288))
            ThreePointArc((-18.6387120488, -9.674627288), (-20.5345573153, -4.3968120117), (-20.9659970002, 1.1945584074))
        make_face()
    extrude(amount=F6_T5_DEPTH, mode=Mode.SUBTRACT)

    # F7 (on face) → F8 (cut)
    with BuildSketch(Plane.XY.offset(6.5)):
        with Locations((-16.2634559673, 0)):
            Circle(F7_R)
        with Locations((0, 16.2634559673)):
            Circle(F7_R)
        with Locations((16.2634559673, 0)):
            Circle(F7_R)
        with Locations((0, -16.2634559673)):
            Circle(F7_R)
    extrude(amount=-F8_DEPTH, mode=Mode.SUBTRACT)


solid = f3.part
